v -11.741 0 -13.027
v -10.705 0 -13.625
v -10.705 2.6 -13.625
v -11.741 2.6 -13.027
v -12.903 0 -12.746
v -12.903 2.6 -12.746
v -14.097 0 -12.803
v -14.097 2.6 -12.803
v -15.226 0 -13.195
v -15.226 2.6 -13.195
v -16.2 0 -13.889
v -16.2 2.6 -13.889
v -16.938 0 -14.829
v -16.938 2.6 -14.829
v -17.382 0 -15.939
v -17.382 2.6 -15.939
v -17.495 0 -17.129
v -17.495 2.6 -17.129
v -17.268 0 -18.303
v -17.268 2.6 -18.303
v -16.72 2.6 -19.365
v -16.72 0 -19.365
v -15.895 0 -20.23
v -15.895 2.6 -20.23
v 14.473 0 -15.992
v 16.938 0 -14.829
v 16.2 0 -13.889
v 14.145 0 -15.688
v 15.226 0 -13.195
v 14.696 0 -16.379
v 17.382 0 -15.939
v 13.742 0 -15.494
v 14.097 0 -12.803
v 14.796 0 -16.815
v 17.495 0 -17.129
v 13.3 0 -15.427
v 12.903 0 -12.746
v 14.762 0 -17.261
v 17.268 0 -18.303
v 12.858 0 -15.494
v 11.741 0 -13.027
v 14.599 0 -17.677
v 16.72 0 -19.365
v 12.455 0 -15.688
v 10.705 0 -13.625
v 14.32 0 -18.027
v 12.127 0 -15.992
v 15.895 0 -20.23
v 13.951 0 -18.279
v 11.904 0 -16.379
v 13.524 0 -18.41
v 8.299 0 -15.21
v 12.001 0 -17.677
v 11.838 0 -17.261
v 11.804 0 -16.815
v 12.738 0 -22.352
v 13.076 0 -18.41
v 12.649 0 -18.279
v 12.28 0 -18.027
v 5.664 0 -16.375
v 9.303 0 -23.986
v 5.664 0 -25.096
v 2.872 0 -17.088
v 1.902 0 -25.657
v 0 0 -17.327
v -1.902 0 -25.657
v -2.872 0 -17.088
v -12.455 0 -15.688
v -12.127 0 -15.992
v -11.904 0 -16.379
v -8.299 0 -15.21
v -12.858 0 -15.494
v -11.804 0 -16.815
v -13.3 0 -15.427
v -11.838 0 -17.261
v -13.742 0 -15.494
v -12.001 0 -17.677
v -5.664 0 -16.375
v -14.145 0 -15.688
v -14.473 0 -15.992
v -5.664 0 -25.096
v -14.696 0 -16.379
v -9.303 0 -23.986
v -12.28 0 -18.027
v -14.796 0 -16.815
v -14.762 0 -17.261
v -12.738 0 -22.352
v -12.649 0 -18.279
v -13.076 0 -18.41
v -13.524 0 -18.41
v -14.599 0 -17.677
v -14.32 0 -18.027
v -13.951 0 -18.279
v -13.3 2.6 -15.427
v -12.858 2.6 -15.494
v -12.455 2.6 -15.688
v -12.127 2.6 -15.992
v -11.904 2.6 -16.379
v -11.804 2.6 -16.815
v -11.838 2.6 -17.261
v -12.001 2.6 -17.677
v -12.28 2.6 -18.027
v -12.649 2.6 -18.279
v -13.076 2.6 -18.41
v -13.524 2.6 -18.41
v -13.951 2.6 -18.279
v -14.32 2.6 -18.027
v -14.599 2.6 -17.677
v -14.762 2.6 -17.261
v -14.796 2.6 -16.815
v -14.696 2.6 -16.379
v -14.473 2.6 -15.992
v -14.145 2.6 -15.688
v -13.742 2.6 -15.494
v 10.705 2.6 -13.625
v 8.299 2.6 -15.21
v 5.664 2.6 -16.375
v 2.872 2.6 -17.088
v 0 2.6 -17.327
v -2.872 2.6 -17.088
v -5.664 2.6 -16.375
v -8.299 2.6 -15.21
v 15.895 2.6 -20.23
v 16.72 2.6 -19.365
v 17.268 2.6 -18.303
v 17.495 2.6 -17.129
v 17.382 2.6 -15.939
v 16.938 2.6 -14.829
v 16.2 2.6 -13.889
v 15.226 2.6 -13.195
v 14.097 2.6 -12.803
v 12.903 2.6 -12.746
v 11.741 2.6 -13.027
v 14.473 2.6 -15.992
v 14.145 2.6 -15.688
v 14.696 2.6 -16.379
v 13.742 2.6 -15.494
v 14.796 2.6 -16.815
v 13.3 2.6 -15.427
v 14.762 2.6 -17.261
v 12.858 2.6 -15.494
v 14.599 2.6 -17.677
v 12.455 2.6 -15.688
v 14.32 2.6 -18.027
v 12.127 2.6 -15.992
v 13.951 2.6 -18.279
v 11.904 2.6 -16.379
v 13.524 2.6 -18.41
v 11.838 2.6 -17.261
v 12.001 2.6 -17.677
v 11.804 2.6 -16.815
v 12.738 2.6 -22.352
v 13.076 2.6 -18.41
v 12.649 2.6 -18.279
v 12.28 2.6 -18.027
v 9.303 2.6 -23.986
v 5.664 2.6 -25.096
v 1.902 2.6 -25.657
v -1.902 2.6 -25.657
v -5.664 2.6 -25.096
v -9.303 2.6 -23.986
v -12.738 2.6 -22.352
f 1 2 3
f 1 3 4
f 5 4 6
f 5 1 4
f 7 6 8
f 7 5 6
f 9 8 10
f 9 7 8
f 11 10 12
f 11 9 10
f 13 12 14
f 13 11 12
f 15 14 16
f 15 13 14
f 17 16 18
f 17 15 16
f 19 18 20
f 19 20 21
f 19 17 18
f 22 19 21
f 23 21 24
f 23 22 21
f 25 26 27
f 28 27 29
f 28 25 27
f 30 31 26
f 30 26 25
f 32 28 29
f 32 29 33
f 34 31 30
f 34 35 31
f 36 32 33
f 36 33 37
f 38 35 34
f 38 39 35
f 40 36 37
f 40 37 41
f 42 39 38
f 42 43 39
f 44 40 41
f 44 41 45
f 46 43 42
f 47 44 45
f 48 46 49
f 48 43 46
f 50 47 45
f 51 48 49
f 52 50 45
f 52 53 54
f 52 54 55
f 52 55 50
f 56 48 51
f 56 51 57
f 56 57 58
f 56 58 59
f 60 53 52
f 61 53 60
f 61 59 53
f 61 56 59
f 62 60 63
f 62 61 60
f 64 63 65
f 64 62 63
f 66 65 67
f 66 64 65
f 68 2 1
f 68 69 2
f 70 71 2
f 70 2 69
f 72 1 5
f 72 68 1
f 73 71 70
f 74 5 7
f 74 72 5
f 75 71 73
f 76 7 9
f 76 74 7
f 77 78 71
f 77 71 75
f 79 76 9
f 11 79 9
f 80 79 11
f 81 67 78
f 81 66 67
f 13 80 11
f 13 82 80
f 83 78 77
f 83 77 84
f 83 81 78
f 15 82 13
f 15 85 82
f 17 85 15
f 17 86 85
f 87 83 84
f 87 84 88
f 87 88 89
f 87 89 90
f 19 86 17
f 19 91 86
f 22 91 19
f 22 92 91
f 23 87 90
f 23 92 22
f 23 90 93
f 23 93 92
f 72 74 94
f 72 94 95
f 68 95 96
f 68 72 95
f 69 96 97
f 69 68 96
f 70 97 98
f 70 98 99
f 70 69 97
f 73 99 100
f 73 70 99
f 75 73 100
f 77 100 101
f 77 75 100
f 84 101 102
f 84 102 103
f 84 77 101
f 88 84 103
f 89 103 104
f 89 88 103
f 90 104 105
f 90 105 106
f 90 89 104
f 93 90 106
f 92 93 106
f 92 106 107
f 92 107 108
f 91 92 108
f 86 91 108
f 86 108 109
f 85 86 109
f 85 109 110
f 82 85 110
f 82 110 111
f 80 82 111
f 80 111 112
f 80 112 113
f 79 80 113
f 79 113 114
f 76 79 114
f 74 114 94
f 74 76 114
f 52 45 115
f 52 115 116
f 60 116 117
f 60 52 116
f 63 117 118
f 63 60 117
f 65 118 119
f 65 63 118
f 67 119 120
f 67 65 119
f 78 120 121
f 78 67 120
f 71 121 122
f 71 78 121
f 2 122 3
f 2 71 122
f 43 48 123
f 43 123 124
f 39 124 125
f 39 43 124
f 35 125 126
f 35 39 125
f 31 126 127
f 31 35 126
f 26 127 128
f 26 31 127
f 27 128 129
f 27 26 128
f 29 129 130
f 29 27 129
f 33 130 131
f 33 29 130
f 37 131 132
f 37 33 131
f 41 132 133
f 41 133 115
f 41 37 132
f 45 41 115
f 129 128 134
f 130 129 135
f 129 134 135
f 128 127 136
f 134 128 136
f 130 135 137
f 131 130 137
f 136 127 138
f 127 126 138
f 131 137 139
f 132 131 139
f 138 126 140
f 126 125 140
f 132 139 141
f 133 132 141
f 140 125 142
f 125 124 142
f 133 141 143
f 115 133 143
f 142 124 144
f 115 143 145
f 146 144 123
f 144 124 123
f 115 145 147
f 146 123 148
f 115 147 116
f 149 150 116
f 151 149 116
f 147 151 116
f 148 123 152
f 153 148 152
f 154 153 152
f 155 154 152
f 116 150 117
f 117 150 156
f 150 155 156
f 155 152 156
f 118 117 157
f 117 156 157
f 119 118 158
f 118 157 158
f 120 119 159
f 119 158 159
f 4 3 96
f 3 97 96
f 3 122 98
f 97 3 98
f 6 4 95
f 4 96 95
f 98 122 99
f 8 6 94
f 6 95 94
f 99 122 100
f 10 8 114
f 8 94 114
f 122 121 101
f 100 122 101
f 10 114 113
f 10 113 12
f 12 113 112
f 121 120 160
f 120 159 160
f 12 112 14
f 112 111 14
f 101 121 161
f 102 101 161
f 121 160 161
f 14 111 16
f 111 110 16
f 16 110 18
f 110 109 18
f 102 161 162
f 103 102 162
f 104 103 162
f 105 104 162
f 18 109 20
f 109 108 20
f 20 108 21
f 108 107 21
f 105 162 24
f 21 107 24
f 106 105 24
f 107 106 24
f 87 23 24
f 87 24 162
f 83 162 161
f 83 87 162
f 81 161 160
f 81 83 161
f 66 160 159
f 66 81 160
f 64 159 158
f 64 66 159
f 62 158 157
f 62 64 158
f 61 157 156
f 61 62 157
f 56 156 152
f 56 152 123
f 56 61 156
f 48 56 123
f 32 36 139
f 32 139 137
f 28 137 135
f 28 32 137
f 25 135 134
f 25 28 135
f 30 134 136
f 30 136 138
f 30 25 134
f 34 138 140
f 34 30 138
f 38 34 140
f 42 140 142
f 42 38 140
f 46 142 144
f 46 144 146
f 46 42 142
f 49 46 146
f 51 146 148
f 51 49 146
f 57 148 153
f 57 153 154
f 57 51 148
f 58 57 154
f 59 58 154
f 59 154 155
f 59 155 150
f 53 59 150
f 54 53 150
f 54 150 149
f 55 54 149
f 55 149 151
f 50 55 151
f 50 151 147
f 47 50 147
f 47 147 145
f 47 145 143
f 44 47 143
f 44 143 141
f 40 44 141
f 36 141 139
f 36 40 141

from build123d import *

# Parameters (mm, degrees)
CROQUIS1_R              = 1.5
SALIENTE_EXTRUIR1_DEPTH = 2.6


with BuildPart() as part:
    # Croquis1 → Saliente-Extruir1 (new body)
    with BuildSketch(Plane(origin=(0, 0, 0), x_dir=(1, 0, 0), z_dir=(0, 1, 0))):
        with BuildLine():
            ThreePointArc((10.705140116, 13.624644249), (0, 17.327173913), (-10.705140116, 13.624644249))
            ThreePointArc((-10.705140116, 13.624644249), (-16.602529664, 14.332314029), (-15.894859884, 20.229703577))
            ThreePointArc((-15.894859884, 20.229703577), (0, 25.727173913), (15.894859884, 20.229703577))
            ThreePointArc((15.894859884, 20.229703577), (16.602529664, 14.332314029), (10.705140116, 13.624644249))
        make_face()
        with Locations(Location((13.3, 16.927173913, 0), (0, 0, 270))):
            Circle(CROQUIS1_R, mode=Mode.SUBTRACT)
        with Locations(Location((-13.3, 16.927173913, 0), (0, 0, 270))):
            Circle(CROQUIS1_R, mode=Mode.SUBTRACT)
    extrude(amount=SALIENTE_EXTRUIR1_DEPTH)


solid = part.part
